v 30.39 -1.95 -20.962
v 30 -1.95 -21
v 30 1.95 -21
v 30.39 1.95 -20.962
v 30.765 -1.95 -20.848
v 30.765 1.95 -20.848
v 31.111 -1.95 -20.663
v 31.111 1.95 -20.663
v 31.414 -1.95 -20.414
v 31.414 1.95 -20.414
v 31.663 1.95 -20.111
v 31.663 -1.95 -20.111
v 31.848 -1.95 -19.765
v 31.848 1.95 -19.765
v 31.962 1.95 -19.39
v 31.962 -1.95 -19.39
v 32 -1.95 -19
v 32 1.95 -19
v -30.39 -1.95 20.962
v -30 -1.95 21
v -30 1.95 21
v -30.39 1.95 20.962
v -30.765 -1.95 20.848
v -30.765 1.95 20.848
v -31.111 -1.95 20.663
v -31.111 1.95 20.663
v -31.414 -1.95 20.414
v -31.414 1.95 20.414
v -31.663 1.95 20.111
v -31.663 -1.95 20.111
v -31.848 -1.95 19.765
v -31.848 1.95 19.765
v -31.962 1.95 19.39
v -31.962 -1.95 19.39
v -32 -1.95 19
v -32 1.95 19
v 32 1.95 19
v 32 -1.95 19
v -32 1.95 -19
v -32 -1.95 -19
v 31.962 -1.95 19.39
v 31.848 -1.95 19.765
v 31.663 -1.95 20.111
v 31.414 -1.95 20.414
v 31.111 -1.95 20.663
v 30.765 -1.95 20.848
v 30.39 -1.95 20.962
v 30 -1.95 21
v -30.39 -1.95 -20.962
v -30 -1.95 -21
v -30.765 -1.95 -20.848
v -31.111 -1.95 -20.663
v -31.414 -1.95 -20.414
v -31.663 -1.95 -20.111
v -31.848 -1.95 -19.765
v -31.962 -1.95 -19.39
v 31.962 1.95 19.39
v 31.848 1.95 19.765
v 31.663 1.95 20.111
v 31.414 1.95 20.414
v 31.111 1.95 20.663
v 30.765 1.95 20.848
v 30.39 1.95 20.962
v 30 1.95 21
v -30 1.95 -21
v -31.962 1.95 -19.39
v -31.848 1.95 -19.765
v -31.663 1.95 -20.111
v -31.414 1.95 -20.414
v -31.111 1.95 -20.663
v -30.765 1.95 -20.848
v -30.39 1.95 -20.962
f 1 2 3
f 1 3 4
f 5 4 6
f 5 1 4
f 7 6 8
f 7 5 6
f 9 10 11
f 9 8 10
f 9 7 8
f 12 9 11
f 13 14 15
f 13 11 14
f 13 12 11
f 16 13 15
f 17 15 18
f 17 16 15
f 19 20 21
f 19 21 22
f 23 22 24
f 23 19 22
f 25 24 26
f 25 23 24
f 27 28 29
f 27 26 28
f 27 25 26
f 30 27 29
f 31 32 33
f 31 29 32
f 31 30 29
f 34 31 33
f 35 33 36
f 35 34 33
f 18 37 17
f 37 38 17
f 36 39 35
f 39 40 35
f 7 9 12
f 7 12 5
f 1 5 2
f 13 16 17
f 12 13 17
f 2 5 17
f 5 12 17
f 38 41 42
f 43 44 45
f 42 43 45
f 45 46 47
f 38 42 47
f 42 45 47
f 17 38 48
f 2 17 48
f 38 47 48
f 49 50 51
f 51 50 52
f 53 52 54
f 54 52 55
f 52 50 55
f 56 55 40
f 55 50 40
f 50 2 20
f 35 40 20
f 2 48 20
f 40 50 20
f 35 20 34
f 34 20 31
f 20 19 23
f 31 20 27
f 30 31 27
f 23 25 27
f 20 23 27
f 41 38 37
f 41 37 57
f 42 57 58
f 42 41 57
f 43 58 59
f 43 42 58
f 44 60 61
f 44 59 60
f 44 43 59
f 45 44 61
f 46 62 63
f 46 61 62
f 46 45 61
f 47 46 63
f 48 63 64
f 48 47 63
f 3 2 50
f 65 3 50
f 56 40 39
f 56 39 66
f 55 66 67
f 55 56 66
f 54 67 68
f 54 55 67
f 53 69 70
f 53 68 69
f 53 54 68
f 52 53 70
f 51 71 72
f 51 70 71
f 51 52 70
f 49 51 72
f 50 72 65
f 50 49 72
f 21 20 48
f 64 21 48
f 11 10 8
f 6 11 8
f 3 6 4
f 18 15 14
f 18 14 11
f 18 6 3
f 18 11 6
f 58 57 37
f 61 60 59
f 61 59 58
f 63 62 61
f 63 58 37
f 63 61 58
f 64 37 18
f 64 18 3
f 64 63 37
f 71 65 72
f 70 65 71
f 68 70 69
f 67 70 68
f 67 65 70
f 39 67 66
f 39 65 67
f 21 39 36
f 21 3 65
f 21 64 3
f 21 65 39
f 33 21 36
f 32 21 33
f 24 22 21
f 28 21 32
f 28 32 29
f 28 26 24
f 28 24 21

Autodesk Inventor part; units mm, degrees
ref_plane "YZ Plane" through (0, 0, 0) normal (1, 0, 0) x (0, 1, 0)
ref_plane "XZ Plane" through (0, 0, 0) normal (0, 1, 0) x (-1, 0, 0)
ref_plane "XY Plane" through (0, 0, 0) normal (0, 0, 1) x (1, 0, 0)
sketch "Sketch1" plane through (0, 0, 0) normal (0, 1, 0) x (-1, 0, 0)
  line L0 (30, 21) -> (-30, 21)
  line L1 (-32, 19) -> (-32, -19)
  line L2 (-30, -21) -> (30, -21)
  line L3 (32, -19) -> (32, 19)
  line L4 (32, 21) -> (-32, -21) construction
  line L5 (-32, 21) -> (32, -21) construction
  arc A0 (30, -21) -> (32, -19) centre (30, -19) ccw
  arc A1 (32, 19) -> (30, 21) centre (30, 19) ccw
  arc A2 (-30, 21) -> (-32, 19) centre (-30, 19) ccw
  arc A3 (-32, -19) -> (-30, -21) centre (-30, -19) ccw
  point P0 (0, 0)
  dimension "d0" = 64
  dimension "d1" = 42
  dimension "d2" = 2
extrude "Extrusion1" add sketch "Sketch1" along normal mid plane 3.9
properties part number "FactionSpecial_Council_Cards_all" material "Paper"
